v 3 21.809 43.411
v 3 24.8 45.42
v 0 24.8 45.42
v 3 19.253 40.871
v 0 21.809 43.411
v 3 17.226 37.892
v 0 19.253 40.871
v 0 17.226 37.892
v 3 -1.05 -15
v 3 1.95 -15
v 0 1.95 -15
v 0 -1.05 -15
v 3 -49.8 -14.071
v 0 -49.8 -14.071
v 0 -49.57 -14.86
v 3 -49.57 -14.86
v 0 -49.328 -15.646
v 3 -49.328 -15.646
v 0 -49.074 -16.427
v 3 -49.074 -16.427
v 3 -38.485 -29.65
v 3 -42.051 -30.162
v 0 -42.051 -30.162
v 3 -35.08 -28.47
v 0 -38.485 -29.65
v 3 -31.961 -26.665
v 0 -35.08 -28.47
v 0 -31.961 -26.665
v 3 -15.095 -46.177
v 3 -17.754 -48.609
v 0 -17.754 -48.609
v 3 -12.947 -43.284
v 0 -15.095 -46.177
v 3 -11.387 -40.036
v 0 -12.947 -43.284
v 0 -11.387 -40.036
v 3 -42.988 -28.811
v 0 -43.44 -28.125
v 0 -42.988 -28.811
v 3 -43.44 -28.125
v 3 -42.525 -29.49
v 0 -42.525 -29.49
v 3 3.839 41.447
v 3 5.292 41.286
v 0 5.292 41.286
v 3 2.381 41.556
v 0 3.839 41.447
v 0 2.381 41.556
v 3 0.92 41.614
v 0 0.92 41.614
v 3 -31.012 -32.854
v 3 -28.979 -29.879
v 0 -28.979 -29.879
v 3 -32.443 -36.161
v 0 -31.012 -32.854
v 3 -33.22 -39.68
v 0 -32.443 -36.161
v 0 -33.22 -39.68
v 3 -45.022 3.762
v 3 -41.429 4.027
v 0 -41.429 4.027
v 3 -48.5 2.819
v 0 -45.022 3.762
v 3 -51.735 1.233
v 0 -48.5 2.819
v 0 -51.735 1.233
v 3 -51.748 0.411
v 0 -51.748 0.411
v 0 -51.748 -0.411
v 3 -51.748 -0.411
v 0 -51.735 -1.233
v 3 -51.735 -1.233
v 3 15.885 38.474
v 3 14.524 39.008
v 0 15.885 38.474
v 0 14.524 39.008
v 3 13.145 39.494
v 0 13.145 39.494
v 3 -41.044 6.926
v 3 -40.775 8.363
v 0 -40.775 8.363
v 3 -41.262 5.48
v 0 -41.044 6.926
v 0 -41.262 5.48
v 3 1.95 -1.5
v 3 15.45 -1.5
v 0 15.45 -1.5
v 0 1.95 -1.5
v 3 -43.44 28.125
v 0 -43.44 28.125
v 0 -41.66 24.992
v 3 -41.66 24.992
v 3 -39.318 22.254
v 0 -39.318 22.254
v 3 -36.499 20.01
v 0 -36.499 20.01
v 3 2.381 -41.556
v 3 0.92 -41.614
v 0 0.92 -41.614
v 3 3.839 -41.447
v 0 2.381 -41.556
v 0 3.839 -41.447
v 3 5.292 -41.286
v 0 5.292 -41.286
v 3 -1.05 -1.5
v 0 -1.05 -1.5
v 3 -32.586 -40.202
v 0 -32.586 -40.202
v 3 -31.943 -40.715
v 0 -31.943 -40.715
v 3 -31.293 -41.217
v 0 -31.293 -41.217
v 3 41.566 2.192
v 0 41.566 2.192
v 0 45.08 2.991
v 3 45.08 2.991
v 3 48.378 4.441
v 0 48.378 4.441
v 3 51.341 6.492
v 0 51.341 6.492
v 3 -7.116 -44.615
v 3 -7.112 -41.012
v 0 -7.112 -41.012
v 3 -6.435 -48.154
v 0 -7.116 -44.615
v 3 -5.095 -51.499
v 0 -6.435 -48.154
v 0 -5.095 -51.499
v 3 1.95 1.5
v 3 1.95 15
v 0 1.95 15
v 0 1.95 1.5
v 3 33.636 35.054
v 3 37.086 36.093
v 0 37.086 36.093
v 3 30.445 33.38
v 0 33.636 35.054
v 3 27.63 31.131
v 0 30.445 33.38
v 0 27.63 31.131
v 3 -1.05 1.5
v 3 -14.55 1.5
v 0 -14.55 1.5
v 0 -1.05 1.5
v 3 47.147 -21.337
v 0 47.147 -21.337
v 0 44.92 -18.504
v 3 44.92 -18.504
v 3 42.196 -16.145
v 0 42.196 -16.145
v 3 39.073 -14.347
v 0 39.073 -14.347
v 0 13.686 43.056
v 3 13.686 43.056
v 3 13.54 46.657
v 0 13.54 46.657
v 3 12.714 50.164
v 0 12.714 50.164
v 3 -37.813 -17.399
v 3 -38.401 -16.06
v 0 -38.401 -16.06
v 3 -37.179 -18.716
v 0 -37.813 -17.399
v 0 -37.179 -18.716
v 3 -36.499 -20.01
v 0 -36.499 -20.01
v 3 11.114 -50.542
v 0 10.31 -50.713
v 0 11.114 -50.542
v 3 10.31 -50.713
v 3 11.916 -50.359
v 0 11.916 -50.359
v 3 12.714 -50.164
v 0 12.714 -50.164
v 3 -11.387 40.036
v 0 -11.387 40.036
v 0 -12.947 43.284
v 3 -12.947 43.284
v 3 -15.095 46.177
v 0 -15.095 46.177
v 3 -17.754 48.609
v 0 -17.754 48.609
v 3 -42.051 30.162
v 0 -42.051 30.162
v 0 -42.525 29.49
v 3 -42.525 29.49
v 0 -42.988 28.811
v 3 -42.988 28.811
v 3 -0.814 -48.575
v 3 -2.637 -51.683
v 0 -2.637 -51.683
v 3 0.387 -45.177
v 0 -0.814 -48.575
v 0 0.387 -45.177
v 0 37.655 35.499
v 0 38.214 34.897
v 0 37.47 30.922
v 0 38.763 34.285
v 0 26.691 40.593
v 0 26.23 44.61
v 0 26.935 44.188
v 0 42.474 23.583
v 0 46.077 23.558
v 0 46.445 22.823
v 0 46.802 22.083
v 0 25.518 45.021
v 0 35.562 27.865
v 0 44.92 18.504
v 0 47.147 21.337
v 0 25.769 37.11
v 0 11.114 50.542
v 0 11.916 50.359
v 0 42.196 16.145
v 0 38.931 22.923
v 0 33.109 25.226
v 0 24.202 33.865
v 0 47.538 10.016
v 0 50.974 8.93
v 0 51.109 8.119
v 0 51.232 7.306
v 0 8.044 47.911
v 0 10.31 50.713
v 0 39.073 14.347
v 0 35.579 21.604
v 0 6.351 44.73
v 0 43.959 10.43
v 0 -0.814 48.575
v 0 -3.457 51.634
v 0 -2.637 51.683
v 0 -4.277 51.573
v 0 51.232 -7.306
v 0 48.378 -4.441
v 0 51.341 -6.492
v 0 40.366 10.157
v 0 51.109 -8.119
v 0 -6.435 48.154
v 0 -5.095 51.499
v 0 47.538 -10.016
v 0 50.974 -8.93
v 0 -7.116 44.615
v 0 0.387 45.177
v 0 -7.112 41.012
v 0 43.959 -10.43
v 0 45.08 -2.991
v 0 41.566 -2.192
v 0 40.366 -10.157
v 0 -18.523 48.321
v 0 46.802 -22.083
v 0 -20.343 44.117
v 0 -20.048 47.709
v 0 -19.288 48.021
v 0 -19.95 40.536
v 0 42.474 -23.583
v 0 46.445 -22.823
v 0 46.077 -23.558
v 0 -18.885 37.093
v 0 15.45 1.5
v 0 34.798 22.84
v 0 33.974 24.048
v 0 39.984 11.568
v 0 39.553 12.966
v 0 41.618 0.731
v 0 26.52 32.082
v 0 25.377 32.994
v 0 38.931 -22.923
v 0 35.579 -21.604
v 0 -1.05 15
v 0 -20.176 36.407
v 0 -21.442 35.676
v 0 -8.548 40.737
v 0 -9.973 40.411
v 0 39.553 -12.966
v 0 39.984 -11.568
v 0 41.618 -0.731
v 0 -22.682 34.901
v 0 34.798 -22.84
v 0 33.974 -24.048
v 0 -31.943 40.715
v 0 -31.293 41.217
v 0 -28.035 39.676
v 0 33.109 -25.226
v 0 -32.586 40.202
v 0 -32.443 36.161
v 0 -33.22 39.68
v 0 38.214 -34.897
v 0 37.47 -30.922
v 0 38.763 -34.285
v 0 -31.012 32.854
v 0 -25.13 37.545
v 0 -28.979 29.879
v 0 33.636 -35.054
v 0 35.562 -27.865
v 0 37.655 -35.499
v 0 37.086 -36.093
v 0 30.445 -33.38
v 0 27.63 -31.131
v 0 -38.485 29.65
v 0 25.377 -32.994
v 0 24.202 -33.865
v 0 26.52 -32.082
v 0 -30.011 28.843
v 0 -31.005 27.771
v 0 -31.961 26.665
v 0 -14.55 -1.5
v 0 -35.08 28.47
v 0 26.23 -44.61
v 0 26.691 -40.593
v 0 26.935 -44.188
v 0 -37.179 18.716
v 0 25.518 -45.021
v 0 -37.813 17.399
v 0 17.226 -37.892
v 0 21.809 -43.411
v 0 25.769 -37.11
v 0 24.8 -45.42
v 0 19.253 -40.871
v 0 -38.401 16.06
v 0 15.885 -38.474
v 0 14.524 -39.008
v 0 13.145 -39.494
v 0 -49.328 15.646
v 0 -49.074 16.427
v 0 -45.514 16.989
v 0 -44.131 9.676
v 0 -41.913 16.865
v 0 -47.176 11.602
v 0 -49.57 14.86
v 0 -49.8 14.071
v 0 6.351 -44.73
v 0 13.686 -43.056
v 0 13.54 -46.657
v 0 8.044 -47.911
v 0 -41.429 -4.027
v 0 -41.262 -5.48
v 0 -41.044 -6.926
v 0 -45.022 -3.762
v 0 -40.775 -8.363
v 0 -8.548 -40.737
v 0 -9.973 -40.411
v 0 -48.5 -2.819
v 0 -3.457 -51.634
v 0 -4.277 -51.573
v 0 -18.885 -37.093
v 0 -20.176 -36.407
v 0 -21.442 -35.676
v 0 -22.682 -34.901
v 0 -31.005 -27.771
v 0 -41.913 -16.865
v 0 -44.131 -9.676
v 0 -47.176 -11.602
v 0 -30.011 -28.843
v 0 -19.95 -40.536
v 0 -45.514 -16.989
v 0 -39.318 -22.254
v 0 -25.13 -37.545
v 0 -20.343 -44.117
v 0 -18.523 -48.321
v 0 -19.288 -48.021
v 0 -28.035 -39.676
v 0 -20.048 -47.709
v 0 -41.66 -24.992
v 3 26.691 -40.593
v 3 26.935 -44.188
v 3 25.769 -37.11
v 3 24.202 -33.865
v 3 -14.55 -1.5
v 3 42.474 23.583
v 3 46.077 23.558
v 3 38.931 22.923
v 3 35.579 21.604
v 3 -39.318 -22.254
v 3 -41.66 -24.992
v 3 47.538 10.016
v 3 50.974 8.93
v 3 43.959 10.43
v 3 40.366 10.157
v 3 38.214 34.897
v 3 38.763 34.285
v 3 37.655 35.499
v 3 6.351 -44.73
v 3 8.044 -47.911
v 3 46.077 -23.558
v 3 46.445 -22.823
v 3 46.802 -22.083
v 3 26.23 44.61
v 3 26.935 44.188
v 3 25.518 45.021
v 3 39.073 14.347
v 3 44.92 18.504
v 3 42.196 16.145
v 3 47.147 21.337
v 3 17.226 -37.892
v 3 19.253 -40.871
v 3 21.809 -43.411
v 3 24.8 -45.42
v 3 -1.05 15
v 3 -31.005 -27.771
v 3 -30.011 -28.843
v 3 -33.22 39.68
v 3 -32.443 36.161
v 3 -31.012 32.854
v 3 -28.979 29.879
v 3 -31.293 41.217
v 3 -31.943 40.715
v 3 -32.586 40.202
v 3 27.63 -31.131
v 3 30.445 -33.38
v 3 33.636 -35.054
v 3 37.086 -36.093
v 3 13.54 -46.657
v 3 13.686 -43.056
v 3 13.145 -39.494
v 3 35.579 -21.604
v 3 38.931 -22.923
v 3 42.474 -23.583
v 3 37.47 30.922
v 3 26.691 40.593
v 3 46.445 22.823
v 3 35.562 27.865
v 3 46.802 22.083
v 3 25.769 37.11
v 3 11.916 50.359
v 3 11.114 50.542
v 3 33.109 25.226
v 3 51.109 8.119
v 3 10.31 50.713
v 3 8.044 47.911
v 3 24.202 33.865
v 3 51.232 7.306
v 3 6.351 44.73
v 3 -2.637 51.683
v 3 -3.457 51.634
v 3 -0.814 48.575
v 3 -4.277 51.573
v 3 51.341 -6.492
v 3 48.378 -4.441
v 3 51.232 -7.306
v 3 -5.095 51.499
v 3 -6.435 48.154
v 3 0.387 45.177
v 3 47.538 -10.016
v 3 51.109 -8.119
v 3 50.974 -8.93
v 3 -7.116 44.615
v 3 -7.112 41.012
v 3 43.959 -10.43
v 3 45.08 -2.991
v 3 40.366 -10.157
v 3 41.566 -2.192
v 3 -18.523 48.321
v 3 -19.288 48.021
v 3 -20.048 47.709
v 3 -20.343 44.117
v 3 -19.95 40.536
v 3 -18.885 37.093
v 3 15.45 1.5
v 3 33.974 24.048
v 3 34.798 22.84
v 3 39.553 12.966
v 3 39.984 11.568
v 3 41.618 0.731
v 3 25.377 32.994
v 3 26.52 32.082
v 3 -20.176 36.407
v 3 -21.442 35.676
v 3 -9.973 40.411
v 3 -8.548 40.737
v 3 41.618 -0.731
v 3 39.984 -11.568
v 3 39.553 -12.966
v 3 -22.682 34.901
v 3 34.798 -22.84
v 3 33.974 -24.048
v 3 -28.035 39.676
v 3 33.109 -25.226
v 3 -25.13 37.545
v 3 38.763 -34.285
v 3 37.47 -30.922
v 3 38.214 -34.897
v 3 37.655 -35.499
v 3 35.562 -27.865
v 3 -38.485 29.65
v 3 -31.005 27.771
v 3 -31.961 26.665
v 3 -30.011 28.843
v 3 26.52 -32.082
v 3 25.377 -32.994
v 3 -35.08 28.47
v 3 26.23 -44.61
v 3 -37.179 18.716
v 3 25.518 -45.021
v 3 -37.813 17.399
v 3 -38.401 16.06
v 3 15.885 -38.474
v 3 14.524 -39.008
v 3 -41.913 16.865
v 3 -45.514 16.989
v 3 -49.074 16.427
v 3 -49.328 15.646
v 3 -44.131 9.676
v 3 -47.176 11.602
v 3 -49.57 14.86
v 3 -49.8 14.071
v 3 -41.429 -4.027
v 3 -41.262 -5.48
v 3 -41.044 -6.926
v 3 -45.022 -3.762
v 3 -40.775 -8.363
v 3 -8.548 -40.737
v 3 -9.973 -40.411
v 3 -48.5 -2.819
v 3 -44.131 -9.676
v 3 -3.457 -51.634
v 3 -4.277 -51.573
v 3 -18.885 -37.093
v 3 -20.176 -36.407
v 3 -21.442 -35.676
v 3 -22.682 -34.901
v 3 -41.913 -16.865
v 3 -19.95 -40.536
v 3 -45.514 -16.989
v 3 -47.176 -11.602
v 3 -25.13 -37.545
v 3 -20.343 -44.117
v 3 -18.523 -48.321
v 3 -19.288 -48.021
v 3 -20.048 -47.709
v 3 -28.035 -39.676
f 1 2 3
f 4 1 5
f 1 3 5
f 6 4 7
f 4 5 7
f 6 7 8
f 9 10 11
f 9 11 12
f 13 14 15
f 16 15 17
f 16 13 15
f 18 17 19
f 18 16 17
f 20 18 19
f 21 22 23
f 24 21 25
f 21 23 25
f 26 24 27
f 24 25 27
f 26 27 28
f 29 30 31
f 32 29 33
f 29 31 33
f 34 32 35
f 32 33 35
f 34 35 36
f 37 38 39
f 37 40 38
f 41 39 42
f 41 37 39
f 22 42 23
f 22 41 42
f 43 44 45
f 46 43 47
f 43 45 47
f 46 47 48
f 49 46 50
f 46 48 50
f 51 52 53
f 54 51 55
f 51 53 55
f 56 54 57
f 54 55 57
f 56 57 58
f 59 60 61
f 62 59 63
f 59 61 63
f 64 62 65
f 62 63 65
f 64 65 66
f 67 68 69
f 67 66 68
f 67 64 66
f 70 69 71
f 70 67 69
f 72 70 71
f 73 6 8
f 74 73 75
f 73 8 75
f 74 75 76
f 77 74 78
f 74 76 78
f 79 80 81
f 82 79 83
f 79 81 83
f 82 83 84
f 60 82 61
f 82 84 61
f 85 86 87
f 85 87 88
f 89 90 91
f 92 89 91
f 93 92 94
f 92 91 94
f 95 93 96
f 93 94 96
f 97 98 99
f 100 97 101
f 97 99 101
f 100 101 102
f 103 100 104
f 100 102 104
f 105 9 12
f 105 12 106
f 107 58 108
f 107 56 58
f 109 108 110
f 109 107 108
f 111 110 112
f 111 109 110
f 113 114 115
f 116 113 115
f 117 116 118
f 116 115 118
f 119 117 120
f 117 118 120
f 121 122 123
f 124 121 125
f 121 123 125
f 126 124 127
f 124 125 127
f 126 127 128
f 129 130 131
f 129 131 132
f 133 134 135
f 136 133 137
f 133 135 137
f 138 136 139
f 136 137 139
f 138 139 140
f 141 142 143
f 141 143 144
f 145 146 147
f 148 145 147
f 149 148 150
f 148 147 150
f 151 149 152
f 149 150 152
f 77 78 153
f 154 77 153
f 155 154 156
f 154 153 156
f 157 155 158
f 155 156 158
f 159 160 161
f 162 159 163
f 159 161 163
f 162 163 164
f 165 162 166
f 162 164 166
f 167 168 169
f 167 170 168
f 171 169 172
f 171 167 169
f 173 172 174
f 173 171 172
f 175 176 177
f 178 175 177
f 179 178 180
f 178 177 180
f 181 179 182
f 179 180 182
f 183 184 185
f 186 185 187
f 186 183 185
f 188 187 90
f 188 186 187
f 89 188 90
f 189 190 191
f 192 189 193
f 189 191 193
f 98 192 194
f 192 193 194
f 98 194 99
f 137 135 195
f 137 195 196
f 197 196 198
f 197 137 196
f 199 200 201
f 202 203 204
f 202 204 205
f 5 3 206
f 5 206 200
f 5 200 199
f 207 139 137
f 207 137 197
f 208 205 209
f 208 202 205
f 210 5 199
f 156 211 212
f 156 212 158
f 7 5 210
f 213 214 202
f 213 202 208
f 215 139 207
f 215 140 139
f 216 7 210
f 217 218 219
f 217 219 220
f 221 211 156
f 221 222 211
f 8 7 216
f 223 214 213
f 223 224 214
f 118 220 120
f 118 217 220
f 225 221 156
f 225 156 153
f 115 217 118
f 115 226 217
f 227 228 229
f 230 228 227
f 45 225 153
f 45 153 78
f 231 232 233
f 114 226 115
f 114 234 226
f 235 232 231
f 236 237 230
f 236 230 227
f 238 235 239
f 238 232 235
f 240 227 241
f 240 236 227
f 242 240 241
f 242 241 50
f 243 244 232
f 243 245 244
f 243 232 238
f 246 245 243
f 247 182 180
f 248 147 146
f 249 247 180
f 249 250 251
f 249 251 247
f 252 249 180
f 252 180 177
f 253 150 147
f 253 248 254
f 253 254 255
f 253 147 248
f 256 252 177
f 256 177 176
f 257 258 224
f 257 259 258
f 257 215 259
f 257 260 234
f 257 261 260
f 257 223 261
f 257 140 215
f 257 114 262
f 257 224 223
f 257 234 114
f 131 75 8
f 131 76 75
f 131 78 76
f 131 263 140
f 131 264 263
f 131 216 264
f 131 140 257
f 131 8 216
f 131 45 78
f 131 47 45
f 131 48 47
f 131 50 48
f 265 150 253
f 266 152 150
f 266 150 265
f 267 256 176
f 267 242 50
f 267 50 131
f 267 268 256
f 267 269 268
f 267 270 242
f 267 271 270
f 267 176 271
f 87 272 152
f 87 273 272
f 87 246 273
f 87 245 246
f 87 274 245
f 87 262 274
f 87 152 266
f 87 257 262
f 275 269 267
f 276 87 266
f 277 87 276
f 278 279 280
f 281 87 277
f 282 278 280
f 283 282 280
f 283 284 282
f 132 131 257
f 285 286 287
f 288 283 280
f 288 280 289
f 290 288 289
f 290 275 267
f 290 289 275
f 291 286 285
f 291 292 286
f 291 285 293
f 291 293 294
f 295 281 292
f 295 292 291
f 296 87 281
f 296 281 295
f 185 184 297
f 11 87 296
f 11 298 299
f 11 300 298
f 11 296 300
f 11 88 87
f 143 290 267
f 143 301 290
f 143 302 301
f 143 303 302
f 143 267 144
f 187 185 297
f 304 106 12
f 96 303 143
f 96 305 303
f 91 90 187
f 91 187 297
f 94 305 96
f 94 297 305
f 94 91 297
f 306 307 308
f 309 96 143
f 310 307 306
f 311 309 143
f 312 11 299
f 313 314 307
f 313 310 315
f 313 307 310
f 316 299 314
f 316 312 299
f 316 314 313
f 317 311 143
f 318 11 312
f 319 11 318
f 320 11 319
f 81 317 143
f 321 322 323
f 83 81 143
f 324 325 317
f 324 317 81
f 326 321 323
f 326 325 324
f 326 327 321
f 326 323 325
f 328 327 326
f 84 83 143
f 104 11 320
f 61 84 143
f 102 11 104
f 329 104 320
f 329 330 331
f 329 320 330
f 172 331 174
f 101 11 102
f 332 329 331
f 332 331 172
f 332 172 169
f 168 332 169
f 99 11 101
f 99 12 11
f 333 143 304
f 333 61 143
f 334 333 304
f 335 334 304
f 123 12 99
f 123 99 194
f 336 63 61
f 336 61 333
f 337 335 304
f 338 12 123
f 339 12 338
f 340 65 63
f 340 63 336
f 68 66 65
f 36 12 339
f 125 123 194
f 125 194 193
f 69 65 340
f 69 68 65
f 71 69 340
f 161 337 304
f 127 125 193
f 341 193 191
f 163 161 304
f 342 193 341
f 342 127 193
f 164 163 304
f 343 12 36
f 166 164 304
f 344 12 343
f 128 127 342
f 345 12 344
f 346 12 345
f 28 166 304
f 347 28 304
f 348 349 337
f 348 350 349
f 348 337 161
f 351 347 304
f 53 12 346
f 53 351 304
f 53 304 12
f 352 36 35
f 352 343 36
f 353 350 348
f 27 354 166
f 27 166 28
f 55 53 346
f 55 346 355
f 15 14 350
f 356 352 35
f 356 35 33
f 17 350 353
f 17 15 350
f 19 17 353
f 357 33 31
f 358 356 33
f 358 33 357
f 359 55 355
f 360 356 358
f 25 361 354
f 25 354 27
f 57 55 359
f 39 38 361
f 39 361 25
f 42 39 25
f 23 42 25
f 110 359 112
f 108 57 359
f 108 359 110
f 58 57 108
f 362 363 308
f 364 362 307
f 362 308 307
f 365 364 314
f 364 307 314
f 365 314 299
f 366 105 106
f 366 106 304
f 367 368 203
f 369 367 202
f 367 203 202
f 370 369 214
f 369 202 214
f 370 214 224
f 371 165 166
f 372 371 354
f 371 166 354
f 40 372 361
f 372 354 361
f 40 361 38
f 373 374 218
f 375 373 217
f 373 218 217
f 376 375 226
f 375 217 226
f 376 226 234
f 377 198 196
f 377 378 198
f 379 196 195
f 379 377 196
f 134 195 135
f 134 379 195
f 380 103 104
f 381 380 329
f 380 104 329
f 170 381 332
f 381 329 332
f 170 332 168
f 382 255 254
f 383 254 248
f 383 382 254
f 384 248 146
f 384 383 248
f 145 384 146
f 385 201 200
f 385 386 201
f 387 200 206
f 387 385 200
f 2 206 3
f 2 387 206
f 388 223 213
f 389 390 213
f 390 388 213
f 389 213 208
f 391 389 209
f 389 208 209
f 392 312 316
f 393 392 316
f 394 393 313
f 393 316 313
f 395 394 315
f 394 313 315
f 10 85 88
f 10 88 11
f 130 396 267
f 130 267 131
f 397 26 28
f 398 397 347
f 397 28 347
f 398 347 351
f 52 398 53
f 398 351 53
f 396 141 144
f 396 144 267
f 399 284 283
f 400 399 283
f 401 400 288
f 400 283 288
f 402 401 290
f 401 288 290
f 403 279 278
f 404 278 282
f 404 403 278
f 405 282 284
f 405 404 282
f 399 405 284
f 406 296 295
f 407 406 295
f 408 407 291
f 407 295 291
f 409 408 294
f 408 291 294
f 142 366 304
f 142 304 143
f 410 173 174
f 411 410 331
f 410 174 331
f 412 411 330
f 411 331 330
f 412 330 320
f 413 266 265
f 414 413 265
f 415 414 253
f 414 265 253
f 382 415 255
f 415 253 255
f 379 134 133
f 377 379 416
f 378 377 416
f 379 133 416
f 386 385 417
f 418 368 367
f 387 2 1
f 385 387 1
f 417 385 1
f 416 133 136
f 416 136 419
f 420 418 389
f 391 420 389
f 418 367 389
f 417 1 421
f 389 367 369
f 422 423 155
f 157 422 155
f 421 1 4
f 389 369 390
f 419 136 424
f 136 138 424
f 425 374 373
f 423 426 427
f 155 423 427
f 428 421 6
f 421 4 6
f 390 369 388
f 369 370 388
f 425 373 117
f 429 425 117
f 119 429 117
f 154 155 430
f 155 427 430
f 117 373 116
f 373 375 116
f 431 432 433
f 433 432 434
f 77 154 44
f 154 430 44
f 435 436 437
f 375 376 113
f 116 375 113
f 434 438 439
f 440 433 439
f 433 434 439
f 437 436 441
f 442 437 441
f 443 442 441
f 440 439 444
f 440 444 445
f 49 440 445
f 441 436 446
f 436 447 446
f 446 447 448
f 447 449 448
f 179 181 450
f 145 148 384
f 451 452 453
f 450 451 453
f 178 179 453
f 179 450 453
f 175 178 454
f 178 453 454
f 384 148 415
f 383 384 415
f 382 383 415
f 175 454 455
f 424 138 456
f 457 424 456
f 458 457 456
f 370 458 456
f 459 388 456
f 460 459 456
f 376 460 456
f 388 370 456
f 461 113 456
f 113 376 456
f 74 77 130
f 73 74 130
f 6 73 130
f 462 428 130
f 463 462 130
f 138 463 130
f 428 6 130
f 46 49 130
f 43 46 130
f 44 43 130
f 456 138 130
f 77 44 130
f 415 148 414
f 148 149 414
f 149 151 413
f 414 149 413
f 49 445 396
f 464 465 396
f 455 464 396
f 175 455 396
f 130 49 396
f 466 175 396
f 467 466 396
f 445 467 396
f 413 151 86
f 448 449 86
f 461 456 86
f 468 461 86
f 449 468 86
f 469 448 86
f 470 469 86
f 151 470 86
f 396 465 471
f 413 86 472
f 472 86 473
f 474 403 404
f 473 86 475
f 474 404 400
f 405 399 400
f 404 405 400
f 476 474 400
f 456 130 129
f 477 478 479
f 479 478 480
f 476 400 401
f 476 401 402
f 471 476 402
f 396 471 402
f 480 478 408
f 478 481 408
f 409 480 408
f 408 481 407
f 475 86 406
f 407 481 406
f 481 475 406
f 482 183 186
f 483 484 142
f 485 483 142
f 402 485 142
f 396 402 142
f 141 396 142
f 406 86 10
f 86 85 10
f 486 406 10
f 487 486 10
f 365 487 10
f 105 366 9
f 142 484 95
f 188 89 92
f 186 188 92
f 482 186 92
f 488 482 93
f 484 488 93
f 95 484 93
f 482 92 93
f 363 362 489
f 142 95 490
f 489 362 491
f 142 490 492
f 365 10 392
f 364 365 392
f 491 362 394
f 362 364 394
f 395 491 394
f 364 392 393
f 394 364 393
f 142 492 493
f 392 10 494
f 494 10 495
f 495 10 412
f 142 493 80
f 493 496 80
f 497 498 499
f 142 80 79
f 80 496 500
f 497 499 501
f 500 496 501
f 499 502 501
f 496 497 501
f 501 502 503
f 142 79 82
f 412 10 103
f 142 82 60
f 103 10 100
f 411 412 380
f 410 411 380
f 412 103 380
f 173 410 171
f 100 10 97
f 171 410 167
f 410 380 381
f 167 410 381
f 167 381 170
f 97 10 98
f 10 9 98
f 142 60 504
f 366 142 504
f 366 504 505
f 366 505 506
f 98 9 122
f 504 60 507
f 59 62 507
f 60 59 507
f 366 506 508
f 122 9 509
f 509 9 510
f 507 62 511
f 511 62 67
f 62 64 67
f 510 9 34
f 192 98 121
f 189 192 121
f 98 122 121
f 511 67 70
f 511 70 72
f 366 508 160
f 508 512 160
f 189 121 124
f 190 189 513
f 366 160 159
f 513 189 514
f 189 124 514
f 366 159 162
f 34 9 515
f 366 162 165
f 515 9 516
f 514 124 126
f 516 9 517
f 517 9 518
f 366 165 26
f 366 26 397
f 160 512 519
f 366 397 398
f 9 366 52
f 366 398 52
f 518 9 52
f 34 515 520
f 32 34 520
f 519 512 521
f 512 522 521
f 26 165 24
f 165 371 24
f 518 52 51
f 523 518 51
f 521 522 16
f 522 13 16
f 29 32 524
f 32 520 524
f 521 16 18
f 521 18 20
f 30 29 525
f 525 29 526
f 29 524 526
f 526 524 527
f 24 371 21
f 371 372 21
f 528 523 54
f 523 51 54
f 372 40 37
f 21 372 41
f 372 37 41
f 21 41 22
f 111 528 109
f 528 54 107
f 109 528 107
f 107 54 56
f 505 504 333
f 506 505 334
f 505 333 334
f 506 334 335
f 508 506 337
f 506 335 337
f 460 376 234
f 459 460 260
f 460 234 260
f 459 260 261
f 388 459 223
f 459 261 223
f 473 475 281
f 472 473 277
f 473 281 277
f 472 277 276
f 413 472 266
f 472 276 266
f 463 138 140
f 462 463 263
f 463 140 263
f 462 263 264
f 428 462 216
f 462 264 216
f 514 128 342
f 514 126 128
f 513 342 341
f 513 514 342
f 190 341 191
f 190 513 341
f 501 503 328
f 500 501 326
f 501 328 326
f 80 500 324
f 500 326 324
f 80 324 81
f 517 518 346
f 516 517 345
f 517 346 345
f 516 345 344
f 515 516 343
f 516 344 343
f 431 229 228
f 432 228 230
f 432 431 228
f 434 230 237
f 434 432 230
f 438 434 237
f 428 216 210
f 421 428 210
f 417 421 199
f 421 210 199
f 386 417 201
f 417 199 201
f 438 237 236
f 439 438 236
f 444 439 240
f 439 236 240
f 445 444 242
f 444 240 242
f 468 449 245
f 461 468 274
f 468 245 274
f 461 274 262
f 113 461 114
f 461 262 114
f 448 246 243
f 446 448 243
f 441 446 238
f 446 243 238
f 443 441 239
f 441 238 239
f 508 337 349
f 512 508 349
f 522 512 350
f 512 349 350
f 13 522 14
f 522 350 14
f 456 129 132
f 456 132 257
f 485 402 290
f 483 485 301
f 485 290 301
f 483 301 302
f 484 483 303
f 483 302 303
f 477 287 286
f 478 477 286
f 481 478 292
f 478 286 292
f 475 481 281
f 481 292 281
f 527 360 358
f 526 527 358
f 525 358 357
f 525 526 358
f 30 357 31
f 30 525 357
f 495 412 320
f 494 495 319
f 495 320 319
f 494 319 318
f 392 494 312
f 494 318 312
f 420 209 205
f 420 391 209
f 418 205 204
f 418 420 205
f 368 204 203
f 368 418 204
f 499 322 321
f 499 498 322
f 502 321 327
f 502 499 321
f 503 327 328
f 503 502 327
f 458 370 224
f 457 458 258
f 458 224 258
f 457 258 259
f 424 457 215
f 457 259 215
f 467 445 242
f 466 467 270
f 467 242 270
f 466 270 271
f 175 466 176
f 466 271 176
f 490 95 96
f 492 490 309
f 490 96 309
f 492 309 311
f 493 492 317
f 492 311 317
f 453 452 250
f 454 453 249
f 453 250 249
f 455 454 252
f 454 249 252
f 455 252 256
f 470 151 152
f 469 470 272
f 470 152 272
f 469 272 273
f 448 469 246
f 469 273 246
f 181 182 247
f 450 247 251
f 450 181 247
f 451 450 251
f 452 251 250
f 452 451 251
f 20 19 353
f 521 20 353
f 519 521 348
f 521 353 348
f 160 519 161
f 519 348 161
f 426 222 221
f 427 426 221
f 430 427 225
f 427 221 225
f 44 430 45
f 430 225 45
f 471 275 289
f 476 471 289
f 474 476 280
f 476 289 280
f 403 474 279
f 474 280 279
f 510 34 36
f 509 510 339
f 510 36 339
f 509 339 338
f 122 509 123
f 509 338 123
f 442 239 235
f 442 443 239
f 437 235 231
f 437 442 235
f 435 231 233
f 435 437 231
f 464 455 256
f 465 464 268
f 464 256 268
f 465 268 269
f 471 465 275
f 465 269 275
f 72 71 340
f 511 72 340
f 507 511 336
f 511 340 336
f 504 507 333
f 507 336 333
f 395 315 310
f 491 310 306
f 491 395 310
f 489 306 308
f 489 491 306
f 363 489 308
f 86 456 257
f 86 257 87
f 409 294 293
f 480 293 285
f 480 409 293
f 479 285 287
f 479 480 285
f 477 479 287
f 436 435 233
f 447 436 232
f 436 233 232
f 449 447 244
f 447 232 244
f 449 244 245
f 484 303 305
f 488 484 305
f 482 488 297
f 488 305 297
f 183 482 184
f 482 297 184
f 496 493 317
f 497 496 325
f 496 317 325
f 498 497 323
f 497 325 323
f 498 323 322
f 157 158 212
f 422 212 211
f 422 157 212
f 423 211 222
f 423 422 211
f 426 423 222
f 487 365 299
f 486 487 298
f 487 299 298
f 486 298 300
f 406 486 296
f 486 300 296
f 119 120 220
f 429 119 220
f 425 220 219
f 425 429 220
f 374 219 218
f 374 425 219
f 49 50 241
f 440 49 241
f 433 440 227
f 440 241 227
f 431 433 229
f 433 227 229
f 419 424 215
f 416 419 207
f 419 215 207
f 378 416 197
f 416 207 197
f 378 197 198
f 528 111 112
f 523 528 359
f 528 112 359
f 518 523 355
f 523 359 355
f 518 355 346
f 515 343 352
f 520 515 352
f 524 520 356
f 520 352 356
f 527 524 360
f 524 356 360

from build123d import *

# Parameters (mm, degrees)
BASPROSKE_W        = 3
BASPROSKE_H        = 51.75
TOOTHCUT_DEPTH     = 74.247013591
TEETHCUTS_COUNT    = 21
TEETHCUTS_ANGLE    = 342.857142857
BORSKE_R           = 0.45
BORE_DEPTH         = 50.0000508
CUT_EXTRUDE1_DEPTH = 74.199531789


with BuildPart() as part:
    # BasProSke → Base-Revolve (revolve)
    with BuildSketch(Plane(origin=(0, 0, 0), x_dir=(1, 0, 0), z_dir=(0, 1, 0)), mode=Mode.PRIVATE) as base_revolve_sk:
        with Locations((1.5, 25.875)):
            Rectangle(BASPROSKE_W, BASPROSKE_H)
    revolve(base_revolve_sk.sketch.rotate(Axis((-10, 0, 0), (1, 0, 0)), 180), axis=Axis((-10, 0, 0), (1, 0, 0)))

    # TooCutSke → ToothCut (cut, through all)
    with BuildSketch(Plane(origin=(0, 0, 0), x_dir=(0, 0, -1), z_dir=(1, 0, 0))):
        with BuildLine():
            ThreePointArc((2.192126265, 41.566235798), (0, 41.624), (-2.192126265, 41.566235798))
            ThreePointArc((-2.192126265, 41.566235798), (-3.643354331, 46.777563157), (-6.511386997, 51.364325018))
            ThreePointArc((-6.511386997, 51.364325018), (0, 51.7754), (6.511386997, 51.364325018))
            ThreePointArc((6.511386997, 51.364325018), (3.643354331, 46.777563157), (2.192126265, 41.566235798))
        make_face()
    toothcut = extrude(amount=TOOTHCUT_DEPTH, mode=Mode.SUBTRACT)

    # TeethCuts: ToothCut ×21 about axis
    teethcuts_axis = Axis((-10, 0, 0), (1, 0, 0))
    for i in range(1, TEETHCUTS_COUNT):
        add(toothcut.rotate(teethcuts_axis, i * TEETHCUTS_ANGLE / (TEETHCUTS_COUNT - 1)), mode=Mode.SUBTRACT)

    # BorSke → Bore (cut, symmetric)
    with BuildSketch(Plane(origin=(0, 0, 0), x_dir=(0, 0, -1), z_dir=(1, 0, 0))):
        with Locations(Location((0, 0, 0), (0, 0, 180))):
            Circle(BORSKE_R)
    extrude(amount=BORE_DEPTH, both=True, mode=Mode.SUBTRACT)

    # Sketch1 → Cut-Extrude1 (cut, through all)
    with BuildSketch(Plane(origin=(3, 0, 0), x_dir=(0, 0, -1), z_dir=(1, 0, 0))):
        Polygon((1.5, 1.95), (15, 1.95), (15, -1.05), (1.5, -1.05), (1.5, -14.55), (-1.5, -14.55), (-1.5, -1.05), (-15, -1.05), (-15, 1.95), (-1.5, 1.95), (-1.5, 15.45), (1.5, 15.45), align=None)
    extrude(amount=-CUT_EXTRUDE1_DEPTH, mode=Mode.SUBTRACT)


solid = part.part
